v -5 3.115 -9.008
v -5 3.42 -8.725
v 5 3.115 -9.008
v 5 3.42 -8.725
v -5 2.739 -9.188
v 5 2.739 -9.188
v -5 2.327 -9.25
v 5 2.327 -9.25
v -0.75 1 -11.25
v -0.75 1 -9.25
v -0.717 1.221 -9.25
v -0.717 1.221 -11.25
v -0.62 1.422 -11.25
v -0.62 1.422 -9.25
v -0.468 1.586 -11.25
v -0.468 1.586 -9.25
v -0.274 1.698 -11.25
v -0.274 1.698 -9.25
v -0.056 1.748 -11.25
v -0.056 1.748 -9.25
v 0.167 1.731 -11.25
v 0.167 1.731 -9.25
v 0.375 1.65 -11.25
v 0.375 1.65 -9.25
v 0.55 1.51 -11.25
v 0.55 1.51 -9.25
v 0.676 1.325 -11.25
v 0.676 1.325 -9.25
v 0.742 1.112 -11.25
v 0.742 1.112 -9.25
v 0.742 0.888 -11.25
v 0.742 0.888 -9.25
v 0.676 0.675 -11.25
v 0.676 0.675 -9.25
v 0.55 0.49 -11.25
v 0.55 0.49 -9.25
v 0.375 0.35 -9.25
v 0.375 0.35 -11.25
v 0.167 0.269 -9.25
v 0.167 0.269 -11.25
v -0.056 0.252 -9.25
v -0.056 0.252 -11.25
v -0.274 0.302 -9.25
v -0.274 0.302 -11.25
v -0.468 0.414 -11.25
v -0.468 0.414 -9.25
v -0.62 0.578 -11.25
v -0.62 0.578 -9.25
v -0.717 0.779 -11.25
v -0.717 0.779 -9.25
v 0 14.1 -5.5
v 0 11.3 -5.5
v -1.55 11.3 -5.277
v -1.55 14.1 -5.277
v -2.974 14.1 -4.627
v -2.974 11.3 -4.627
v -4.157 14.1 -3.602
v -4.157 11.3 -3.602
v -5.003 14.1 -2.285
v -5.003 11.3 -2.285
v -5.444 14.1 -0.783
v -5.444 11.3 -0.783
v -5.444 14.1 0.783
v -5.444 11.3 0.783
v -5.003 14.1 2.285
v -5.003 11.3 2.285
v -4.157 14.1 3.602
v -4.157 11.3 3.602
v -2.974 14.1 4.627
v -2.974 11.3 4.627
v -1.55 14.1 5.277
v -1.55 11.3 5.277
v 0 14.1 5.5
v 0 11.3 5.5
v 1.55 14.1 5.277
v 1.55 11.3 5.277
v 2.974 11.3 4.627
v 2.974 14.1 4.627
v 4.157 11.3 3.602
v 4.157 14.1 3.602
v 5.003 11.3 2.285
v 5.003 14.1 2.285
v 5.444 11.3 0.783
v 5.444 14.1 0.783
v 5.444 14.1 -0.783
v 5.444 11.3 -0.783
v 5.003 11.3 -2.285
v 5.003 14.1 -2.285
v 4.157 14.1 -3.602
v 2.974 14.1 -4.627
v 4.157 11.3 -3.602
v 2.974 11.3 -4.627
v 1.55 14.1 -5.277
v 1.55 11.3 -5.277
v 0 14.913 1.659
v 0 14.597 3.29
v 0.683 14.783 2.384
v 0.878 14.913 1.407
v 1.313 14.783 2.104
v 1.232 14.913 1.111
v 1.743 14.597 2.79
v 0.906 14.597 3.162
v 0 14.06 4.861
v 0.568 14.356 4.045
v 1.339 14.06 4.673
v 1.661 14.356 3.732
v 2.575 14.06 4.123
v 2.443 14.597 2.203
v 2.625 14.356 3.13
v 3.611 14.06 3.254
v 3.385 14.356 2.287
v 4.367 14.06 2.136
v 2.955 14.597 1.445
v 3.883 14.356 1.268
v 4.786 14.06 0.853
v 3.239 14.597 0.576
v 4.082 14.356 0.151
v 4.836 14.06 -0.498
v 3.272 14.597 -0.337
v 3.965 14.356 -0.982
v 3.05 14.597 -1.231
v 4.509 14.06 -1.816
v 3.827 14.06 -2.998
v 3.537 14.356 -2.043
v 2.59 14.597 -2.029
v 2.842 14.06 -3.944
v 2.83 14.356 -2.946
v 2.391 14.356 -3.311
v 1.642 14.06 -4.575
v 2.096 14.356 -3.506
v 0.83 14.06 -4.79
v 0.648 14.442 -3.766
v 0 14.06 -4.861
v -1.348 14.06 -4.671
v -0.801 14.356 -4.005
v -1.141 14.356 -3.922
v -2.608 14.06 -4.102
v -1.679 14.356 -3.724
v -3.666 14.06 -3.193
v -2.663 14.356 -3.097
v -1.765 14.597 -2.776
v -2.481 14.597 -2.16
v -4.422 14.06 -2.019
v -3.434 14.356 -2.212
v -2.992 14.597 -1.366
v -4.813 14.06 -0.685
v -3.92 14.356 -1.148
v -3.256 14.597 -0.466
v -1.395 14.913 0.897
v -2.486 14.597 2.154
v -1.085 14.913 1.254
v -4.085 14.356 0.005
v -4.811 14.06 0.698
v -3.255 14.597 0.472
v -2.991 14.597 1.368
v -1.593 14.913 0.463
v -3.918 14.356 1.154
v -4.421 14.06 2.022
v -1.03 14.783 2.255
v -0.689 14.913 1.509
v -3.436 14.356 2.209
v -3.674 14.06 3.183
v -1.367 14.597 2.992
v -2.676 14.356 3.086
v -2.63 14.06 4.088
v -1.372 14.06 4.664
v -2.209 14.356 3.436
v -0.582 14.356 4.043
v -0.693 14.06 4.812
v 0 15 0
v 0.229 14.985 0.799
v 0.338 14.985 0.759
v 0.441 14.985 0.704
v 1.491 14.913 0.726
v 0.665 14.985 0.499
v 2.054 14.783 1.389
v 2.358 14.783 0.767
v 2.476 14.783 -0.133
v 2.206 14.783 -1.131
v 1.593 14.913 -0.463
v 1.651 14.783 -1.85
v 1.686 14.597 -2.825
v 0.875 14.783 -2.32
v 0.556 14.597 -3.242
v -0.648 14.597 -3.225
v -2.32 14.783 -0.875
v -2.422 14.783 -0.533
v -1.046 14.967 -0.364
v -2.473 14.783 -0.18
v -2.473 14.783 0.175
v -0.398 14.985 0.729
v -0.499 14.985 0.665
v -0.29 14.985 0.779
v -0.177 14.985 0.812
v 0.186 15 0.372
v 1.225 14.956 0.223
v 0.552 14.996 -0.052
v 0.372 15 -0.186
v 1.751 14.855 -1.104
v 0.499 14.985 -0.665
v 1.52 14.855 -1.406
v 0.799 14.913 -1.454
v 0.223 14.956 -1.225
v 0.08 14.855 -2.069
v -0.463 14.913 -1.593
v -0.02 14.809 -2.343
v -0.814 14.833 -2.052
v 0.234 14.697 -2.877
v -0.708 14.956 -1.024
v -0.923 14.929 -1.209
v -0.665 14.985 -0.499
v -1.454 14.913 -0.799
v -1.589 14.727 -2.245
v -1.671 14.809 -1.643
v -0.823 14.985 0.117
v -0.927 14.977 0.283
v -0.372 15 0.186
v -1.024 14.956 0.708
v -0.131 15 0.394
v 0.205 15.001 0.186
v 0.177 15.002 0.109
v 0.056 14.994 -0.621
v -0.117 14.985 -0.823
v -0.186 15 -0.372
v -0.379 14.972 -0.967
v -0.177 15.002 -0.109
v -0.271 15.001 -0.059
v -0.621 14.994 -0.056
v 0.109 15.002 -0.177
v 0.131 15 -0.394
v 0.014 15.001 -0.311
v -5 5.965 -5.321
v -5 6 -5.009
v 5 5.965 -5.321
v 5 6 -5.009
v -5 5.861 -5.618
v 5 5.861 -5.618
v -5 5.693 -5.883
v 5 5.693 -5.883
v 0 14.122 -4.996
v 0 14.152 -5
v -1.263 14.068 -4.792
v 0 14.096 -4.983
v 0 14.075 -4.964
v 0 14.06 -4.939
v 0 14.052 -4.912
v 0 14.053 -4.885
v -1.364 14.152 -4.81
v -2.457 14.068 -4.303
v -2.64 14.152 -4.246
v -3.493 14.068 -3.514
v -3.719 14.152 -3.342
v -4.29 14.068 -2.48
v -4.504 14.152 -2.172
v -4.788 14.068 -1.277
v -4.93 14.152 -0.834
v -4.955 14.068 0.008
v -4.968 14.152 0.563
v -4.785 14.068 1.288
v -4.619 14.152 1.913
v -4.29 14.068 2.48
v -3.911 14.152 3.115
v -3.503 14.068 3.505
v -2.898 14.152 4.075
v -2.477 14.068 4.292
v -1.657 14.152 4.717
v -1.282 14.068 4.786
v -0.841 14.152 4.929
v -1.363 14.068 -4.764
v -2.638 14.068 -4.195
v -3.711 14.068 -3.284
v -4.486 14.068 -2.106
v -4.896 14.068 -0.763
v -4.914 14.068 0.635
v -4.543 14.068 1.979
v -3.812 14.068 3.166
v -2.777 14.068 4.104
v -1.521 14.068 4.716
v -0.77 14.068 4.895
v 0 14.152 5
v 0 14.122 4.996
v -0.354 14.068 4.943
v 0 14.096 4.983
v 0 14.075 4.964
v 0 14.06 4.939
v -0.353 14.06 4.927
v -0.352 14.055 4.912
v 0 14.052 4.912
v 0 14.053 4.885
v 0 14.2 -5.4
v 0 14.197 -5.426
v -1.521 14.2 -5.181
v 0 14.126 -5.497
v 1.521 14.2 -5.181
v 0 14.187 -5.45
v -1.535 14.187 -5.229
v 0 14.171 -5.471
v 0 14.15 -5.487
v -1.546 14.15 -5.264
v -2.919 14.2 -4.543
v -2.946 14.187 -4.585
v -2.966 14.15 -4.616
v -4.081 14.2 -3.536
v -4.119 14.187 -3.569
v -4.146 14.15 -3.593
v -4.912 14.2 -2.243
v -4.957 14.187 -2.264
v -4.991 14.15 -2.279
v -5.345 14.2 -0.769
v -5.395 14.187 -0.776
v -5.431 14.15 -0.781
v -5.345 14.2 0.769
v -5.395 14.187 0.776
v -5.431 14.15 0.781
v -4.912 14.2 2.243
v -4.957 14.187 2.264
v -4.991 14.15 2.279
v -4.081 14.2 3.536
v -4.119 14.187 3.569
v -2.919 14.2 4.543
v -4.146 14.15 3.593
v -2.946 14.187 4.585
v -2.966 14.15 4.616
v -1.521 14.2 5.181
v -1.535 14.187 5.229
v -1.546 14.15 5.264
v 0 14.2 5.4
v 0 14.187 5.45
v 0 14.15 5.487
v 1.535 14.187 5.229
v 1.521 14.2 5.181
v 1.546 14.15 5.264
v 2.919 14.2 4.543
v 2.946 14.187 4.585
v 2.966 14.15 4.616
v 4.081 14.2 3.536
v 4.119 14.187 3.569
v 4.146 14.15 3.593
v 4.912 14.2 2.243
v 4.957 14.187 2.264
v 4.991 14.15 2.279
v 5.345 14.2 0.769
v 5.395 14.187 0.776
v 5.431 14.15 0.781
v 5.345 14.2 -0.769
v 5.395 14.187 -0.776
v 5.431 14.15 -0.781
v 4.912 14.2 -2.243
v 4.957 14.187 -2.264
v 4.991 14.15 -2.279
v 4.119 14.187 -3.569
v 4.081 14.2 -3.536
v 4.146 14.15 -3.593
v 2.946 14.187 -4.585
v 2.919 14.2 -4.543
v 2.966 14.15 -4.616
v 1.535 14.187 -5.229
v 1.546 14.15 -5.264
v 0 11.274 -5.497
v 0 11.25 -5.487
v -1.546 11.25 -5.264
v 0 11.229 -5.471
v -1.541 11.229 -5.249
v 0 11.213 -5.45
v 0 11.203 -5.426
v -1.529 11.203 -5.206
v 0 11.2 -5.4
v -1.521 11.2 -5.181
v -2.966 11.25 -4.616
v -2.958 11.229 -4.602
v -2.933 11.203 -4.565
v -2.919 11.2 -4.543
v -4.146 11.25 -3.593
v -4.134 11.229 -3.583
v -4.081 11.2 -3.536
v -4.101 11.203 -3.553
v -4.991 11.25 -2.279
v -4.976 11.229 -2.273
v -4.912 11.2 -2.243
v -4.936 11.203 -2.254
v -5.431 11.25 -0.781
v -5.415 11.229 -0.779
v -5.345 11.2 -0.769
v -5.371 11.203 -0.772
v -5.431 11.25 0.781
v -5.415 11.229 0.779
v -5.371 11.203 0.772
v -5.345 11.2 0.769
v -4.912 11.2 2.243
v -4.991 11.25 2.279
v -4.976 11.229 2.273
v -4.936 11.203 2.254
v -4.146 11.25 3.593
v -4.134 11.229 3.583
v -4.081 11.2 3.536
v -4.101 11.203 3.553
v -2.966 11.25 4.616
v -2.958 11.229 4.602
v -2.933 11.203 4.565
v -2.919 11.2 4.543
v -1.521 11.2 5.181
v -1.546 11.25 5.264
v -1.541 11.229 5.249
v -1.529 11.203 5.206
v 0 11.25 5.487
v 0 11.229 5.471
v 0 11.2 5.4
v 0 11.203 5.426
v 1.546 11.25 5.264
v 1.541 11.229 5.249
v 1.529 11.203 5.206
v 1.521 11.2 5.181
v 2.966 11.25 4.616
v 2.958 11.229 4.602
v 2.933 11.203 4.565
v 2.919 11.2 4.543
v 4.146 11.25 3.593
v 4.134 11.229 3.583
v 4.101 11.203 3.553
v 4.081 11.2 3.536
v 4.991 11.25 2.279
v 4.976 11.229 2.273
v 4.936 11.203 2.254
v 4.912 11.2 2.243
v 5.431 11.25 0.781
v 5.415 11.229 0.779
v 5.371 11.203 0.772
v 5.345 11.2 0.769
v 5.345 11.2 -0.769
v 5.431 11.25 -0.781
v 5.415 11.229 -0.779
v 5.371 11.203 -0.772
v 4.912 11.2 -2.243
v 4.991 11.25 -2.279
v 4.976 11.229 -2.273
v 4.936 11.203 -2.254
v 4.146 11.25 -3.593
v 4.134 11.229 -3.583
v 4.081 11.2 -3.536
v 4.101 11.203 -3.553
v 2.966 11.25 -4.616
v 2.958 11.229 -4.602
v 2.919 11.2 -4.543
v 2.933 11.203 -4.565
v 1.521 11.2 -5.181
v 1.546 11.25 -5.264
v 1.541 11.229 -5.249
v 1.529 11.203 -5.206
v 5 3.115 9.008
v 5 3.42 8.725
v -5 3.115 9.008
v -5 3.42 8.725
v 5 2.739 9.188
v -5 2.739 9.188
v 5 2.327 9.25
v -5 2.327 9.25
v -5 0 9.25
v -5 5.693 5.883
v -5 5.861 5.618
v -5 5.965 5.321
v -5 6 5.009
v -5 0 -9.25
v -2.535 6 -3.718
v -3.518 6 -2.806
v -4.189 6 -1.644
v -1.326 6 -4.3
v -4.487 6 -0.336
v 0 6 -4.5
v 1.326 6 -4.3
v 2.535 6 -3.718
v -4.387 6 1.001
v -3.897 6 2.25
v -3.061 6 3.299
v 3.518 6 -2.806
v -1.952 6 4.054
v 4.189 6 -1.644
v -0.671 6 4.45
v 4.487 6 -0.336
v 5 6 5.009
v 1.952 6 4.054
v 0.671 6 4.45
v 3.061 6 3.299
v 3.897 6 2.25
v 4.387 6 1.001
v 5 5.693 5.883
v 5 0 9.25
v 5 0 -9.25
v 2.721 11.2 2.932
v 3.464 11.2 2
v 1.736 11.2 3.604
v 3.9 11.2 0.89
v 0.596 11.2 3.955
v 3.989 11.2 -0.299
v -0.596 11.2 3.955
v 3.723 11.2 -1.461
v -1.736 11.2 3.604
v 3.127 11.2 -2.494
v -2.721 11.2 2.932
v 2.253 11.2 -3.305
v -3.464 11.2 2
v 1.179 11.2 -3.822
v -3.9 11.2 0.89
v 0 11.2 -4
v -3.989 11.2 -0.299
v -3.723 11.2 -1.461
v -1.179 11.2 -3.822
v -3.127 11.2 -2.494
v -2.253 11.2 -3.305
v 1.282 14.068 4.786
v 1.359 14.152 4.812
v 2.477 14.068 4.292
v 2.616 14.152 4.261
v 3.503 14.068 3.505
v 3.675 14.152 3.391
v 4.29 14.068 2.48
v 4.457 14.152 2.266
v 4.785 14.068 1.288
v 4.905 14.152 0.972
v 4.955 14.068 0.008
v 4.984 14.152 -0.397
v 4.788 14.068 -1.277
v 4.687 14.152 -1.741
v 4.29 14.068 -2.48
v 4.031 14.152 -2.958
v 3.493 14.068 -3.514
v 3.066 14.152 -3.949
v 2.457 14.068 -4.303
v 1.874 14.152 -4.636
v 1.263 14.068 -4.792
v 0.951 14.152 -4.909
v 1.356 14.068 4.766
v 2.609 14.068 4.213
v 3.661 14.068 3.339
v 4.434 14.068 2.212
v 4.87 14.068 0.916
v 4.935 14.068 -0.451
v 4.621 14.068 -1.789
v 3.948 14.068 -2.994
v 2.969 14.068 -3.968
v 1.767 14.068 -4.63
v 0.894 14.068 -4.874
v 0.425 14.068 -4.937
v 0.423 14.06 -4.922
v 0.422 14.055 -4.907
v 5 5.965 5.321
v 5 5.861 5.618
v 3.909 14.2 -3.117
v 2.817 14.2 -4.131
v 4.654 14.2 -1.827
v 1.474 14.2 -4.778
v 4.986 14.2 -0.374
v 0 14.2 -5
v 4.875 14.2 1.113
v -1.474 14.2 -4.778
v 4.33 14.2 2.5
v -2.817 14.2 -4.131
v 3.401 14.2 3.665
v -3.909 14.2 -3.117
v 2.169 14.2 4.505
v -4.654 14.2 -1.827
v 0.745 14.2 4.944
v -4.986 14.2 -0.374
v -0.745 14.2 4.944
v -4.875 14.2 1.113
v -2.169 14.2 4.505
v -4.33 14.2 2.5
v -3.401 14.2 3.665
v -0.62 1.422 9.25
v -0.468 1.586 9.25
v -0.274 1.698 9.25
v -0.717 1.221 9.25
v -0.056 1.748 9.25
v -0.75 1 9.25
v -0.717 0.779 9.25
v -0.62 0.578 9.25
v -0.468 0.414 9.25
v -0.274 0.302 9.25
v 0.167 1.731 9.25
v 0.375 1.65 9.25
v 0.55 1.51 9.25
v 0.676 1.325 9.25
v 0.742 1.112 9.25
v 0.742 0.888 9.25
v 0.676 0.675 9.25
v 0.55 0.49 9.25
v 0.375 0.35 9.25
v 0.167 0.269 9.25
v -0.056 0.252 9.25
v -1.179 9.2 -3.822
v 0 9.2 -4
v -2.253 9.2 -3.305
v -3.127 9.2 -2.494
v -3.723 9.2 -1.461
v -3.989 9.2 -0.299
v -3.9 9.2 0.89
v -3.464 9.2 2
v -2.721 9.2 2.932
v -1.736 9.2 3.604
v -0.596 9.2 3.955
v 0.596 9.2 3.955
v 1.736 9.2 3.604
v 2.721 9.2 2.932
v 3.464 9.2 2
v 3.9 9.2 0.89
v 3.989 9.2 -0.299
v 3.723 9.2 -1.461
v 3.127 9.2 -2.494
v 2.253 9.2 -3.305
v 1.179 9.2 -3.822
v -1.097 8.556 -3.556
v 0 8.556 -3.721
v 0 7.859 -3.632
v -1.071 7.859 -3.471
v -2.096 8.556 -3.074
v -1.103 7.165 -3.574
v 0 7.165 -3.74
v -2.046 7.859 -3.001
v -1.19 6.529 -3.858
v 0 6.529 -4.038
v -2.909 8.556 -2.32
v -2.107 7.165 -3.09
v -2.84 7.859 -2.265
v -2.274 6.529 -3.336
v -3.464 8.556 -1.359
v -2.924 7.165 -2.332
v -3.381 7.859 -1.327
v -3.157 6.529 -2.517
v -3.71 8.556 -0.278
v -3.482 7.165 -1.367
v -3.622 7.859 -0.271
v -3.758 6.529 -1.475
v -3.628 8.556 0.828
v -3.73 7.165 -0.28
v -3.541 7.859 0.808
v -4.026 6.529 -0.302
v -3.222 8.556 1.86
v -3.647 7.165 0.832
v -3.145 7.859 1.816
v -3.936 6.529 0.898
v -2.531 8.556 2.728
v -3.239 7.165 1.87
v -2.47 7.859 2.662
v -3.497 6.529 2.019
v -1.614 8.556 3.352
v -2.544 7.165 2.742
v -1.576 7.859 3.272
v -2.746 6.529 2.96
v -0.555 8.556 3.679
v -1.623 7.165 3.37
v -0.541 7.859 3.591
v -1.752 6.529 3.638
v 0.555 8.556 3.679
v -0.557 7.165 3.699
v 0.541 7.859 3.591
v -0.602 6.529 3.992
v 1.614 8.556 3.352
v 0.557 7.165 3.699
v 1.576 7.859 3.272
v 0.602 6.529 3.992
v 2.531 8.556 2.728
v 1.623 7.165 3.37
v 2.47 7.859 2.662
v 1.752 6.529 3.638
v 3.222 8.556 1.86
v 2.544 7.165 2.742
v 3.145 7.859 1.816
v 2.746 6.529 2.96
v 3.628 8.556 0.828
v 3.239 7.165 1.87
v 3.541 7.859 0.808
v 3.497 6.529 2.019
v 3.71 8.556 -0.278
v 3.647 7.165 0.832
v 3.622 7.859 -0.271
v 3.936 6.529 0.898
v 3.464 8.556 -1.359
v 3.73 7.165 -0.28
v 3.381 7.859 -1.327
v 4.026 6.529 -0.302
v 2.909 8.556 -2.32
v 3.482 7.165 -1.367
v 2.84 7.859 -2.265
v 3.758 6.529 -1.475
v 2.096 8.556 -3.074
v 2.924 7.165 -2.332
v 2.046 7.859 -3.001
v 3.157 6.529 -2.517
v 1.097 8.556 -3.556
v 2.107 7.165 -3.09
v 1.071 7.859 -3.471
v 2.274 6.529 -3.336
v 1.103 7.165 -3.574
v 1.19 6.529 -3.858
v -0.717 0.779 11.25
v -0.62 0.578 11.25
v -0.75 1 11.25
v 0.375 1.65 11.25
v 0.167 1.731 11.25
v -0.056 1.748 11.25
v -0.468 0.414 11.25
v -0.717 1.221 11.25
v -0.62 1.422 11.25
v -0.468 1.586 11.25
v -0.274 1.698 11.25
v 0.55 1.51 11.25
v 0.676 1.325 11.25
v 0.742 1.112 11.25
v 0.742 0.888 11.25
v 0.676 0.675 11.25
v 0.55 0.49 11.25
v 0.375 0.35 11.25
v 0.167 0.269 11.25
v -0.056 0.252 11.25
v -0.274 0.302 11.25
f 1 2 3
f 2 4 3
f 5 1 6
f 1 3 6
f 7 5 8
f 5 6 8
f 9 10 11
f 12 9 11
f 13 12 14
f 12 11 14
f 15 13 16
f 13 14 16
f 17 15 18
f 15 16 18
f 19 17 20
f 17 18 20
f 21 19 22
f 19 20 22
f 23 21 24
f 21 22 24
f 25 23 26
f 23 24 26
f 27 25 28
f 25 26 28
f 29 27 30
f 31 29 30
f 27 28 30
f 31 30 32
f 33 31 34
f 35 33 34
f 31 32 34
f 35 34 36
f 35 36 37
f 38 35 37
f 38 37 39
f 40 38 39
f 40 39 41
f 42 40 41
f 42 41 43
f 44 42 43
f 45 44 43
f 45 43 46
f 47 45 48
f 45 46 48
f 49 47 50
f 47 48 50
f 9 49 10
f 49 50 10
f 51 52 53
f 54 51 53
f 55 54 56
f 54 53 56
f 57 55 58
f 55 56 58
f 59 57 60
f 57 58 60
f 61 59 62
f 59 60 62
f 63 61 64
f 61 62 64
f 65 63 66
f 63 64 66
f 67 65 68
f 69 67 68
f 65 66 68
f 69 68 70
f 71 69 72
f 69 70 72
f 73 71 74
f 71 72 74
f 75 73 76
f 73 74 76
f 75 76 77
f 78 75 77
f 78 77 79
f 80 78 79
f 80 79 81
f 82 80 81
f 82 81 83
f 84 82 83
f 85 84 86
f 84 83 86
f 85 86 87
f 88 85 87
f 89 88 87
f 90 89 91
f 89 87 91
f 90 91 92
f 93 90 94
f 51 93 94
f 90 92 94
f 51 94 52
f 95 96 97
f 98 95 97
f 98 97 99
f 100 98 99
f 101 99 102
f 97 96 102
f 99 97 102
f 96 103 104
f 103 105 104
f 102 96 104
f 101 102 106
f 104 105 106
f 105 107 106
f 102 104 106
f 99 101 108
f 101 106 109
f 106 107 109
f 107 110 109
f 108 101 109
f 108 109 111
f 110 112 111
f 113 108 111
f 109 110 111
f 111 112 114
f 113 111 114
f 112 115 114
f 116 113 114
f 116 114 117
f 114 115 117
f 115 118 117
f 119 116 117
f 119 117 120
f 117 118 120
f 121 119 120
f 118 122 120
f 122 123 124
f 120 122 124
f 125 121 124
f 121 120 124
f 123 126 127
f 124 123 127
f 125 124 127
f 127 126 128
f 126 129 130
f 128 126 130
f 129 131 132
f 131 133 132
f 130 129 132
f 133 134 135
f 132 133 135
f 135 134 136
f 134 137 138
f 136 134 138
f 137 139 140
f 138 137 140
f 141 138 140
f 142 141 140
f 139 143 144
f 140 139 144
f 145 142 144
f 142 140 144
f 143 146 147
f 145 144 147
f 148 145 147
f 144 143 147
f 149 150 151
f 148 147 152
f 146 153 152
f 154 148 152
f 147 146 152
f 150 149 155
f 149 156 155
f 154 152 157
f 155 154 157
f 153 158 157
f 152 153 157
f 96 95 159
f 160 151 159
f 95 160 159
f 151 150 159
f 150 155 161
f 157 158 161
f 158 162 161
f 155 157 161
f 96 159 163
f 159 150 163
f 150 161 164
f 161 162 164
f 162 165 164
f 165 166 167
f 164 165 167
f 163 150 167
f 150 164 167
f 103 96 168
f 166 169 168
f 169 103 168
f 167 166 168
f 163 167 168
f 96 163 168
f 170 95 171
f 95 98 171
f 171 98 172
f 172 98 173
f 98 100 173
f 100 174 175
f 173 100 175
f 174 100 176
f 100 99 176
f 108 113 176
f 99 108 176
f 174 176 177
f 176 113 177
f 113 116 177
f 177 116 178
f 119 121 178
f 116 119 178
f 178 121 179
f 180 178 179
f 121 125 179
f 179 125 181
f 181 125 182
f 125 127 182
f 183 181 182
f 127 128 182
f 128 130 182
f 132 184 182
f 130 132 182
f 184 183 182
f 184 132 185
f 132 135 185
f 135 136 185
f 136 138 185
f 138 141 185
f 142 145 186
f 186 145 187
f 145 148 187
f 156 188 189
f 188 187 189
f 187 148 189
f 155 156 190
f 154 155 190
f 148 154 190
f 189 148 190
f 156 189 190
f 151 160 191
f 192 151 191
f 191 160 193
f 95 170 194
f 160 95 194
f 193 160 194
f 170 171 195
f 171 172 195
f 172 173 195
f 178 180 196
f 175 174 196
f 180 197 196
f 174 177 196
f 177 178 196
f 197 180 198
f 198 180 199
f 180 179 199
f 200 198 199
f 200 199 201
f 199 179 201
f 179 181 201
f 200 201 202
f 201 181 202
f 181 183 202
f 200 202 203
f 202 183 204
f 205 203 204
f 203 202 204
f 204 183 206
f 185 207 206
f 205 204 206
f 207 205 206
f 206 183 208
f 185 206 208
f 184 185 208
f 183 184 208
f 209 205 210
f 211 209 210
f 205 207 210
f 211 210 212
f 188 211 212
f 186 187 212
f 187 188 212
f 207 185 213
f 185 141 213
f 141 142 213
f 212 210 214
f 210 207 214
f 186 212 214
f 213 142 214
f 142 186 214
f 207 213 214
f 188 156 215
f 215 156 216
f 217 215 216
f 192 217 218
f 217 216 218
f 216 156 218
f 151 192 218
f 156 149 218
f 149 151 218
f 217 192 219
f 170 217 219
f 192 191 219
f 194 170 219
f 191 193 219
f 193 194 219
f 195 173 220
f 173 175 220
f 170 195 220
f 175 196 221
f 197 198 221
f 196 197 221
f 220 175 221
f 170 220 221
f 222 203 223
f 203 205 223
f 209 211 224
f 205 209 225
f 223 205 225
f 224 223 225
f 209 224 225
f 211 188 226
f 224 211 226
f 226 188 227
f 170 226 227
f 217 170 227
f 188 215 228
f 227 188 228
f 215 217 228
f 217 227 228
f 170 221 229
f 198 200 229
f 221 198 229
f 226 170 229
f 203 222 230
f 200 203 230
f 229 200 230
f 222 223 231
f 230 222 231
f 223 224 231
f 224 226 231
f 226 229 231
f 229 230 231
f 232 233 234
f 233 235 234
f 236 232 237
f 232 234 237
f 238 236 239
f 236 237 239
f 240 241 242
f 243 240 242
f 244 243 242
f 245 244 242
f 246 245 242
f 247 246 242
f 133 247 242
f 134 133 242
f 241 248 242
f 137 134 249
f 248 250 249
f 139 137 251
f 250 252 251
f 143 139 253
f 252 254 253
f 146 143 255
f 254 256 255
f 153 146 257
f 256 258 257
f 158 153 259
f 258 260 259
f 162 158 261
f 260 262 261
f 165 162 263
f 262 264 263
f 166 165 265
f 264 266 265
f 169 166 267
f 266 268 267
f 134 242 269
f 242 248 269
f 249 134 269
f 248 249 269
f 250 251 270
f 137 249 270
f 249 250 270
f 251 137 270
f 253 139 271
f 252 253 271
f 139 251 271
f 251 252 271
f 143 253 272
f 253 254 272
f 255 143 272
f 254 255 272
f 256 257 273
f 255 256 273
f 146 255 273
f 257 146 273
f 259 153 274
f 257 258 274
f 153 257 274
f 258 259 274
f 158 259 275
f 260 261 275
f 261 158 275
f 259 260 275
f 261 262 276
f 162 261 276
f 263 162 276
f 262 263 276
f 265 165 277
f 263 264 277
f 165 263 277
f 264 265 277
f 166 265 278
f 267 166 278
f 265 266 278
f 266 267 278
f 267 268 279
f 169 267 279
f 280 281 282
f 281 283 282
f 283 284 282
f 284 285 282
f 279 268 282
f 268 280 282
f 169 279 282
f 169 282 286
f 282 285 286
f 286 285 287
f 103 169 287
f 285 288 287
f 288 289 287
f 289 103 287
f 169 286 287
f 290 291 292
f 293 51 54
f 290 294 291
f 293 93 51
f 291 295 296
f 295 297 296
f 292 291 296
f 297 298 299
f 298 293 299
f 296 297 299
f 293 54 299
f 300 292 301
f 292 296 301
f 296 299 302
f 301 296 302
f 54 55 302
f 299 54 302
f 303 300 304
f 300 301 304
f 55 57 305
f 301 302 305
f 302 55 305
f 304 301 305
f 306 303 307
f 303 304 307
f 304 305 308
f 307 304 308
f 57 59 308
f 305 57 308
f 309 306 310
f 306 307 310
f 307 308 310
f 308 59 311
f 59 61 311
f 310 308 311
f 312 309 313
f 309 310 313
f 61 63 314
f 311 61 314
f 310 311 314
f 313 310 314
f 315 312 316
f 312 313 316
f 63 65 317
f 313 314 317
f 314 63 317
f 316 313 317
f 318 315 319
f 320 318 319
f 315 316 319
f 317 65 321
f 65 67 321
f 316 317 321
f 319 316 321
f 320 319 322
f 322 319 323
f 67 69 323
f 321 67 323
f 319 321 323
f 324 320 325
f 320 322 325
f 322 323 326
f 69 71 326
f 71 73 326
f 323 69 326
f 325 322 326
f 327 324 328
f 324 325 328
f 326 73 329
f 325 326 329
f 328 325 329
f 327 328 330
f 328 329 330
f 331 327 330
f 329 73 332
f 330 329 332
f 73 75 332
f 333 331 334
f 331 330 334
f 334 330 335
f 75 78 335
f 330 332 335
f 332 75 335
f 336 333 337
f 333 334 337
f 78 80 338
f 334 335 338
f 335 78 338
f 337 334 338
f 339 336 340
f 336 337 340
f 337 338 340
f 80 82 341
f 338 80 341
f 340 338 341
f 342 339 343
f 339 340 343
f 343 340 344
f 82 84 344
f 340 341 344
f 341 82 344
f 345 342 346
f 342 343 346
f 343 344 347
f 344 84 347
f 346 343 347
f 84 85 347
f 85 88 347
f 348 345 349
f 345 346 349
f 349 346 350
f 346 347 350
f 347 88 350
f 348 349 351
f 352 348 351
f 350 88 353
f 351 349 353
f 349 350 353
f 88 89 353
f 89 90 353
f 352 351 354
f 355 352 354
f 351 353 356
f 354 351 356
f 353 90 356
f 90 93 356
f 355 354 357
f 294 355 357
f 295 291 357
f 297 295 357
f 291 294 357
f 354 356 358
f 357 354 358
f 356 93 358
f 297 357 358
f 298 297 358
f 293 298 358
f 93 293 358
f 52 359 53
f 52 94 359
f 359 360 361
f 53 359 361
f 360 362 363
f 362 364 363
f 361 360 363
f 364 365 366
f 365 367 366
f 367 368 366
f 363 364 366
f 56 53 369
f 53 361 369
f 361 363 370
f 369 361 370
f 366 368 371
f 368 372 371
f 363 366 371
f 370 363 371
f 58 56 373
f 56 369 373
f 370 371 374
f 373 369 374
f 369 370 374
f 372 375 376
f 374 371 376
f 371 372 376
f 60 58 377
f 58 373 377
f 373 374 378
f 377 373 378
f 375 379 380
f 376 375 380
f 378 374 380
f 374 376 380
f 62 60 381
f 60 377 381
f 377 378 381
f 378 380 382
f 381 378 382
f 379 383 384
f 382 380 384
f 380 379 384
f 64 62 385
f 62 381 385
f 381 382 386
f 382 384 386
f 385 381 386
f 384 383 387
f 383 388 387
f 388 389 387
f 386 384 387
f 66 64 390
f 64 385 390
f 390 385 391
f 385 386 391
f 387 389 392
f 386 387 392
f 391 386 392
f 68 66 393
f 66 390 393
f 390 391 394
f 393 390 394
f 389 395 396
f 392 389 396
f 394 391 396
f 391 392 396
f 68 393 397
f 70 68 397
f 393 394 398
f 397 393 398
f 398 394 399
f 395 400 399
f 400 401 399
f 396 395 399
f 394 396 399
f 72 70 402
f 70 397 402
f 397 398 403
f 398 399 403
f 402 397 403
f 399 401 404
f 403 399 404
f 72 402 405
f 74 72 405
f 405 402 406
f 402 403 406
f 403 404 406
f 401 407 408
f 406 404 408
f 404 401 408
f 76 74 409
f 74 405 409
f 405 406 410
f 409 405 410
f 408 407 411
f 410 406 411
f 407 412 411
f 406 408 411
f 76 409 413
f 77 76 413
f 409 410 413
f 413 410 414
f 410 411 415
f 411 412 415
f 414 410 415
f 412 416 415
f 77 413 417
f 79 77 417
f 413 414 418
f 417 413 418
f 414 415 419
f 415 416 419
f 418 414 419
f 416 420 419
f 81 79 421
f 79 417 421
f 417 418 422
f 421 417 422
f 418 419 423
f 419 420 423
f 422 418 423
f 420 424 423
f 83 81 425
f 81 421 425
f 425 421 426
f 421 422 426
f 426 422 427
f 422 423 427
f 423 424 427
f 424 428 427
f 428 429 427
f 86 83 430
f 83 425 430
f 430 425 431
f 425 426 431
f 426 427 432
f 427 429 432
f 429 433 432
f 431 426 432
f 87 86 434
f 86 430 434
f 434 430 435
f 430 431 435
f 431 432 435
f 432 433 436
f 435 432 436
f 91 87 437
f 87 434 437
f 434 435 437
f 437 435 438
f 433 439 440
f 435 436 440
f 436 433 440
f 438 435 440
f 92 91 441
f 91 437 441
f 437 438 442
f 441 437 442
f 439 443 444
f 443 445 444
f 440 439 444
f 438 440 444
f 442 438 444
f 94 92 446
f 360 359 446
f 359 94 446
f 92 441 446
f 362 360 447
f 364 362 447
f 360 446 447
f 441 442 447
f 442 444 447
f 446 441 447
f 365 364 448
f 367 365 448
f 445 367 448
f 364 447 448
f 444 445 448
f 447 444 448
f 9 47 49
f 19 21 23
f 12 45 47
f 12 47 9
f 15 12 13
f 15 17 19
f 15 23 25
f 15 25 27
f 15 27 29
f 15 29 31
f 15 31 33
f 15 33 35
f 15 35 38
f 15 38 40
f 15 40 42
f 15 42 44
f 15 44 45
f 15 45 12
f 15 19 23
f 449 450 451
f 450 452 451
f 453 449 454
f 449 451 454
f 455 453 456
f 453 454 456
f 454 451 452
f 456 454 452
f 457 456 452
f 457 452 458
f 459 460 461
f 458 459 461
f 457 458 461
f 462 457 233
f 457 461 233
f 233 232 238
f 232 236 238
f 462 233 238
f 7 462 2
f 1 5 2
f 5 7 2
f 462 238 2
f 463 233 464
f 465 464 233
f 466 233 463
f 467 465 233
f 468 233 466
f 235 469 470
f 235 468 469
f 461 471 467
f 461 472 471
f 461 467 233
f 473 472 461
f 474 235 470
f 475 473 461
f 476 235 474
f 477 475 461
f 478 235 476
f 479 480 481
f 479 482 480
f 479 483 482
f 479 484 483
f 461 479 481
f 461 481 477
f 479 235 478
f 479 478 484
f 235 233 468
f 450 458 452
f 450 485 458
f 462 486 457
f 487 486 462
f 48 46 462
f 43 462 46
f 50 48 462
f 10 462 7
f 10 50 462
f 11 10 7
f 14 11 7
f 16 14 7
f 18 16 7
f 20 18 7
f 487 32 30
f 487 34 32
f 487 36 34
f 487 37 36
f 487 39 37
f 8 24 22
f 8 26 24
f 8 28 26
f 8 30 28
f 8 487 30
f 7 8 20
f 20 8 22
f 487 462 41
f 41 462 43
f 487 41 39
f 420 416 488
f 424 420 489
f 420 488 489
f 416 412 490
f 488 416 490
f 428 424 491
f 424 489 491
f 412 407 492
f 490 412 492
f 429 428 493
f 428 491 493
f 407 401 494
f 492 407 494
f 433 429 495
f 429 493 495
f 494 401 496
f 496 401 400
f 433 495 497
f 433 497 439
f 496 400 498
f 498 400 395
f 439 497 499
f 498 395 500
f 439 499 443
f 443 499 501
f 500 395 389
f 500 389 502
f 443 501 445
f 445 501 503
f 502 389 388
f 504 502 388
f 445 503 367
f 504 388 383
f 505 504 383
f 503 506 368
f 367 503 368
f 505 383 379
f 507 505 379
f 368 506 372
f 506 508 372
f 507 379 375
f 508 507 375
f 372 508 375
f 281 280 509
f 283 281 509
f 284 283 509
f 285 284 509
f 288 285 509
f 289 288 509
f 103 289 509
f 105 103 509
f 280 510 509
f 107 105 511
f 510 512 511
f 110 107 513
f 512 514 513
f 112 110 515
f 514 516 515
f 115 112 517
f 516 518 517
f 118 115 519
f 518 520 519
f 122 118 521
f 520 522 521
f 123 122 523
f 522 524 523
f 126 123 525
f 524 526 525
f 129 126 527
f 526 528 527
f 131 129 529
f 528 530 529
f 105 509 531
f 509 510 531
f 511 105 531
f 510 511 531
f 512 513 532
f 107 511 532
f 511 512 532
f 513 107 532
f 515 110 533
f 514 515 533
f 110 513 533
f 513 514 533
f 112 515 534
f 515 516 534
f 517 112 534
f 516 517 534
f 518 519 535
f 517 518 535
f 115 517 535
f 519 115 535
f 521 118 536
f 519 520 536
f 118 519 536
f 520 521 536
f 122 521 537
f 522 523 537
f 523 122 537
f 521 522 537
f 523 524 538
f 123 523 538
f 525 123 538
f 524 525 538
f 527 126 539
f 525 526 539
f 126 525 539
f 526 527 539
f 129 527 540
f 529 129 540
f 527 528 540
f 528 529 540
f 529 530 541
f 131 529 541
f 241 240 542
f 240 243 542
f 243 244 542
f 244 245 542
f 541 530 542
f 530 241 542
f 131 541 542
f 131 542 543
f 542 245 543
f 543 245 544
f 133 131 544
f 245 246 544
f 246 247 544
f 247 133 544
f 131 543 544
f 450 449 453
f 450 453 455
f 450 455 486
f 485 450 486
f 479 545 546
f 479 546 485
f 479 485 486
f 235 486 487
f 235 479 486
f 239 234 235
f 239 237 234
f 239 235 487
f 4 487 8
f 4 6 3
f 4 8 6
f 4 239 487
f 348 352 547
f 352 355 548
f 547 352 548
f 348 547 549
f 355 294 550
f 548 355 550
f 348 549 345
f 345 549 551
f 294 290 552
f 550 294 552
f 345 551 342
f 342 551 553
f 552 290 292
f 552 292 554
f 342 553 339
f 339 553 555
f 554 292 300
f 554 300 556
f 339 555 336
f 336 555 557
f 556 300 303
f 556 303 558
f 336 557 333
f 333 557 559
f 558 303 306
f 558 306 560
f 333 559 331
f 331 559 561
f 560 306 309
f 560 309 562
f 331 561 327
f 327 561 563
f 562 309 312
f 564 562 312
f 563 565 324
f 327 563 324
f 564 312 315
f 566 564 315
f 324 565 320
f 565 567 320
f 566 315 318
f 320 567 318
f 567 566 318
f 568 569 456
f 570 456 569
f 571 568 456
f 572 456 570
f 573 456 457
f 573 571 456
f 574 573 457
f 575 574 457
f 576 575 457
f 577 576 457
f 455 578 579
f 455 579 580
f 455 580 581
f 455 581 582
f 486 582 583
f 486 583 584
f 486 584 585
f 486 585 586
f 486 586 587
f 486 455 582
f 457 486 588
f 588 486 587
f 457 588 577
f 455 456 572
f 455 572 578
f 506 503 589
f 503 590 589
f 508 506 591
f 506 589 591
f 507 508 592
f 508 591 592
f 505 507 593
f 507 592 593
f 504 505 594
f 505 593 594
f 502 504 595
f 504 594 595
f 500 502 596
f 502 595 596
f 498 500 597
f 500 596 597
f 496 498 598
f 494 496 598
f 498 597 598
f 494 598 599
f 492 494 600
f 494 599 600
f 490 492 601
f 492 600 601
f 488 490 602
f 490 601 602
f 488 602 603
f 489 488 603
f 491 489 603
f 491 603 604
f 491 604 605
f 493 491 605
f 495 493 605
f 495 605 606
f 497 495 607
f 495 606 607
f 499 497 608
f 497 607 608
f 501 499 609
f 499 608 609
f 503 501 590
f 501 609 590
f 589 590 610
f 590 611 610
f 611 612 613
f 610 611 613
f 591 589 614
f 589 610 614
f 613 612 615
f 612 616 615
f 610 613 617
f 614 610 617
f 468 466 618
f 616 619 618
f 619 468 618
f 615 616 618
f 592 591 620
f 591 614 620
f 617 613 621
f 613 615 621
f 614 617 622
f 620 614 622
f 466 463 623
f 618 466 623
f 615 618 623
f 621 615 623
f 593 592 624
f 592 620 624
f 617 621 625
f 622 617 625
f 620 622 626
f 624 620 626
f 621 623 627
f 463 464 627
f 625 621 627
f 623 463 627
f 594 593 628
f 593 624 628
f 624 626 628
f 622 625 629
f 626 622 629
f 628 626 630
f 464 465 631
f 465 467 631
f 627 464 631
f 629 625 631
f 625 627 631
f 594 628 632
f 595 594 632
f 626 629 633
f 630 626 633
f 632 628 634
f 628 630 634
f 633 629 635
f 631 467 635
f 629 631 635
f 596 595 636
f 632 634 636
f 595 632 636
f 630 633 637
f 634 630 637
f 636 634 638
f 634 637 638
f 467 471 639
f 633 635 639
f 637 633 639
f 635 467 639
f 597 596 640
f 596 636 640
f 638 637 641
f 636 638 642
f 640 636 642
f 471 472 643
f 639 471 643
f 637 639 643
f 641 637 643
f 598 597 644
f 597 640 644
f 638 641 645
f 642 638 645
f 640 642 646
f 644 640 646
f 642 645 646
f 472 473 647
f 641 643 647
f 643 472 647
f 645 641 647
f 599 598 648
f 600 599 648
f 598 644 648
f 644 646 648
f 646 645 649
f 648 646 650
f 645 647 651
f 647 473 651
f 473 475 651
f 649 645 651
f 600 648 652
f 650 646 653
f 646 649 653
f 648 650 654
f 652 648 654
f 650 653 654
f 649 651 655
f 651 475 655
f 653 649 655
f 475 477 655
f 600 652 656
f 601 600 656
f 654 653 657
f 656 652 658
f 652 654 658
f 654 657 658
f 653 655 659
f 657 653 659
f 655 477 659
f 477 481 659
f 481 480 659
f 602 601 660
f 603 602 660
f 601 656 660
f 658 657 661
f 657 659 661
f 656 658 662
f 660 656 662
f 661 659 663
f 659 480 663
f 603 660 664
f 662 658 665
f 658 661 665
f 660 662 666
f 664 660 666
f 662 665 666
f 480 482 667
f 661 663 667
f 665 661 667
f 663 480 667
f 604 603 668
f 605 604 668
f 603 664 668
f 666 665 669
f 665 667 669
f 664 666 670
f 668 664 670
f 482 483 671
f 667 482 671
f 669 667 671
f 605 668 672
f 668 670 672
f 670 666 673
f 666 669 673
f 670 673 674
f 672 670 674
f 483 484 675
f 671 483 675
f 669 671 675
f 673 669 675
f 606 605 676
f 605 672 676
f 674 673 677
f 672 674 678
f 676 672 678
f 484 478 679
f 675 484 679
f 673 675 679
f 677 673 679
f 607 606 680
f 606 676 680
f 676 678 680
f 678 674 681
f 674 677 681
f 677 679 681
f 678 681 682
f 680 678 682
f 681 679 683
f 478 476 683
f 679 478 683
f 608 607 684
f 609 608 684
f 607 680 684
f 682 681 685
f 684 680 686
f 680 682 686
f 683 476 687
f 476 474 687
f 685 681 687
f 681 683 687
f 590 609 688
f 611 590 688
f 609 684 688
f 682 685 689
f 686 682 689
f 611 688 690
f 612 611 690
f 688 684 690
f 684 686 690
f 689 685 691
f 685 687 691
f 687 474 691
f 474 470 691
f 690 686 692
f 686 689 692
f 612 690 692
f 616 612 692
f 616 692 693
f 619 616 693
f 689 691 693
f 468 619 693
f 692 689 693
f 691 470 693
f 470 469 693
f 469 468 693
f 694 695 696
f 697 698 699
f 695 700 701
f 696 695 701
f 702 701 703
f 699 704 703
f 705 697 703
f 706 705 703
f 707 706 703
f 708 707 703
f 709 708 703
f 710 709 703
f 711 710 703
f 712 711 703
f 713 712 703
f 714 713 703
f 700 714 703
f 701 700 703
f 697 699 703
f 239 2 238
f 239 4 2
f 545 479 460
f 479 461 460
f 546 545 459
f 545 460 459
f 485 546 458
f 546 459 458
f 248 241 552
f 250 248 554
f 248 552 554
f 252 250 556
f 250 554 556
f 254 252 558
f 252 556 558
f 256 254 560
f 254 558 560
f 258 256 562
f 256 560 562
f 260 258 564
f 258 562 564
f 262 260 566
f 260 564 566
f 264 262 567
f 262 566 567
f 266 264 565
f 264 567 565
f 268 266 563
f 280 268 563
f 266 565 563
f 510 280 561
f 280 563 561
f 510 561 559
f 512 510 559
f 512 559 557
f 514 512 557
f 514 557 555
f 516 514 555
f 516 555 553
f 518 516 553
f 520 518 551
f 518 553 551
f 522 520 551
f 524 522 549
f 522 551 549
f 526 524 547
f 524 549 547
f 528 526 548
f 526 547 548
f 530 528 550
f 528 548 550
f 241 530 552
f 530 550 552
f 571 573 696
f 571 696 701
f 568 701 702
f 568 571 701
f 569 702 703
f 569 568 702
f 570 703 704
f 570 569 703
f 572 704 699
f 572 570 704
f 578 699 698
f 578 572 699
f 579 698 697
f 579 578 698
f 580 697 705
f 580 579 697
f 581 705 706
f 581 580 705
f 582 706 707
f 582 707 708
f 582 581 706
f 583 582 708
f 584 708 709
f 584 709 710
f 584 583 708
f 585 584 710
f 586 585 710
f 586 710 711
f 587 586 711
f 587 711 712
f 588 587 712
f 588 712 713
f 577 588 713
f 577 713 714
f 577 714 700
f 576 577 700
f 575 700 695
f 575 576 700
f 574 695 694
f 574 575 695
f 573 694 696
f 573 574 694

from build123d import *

# Parameters (mm, degrees)
BOSS_EXTRUDE1_DEPTH = 5
FILLET1_R           = 0.1
FILLET2_R           = 0.1
FILLET3_R           = 1.4
SKETCH4_R           = 0.75
BOSS_EXTRUDE2_DEPTH = 2


with BuildPart() as part:
    # Sketch1 → Boss-Extrude1 (new body, symmetric)
    with BuildSketch(Plane(origin=(0, 0, 0), x_dir=(0, 0, -1), z_dir=(1, 0, 0))):
        Polygon((-9.25, 0), (9.25, 0), (9.25, 3), (5.5, 6), (-5.5, 6), (-9.25, 3), align=None)
    extrude(amount=BOSS_EXTRUDE1_DEPTH, both=True)

    # Sketch2 → Revolve1 (revolve)
    with BuildSketch(Plane(origin=(0, 0, 0), x_dir=(0, 0, -1), z_dir=(1, 0, 0))):
        with BuildLine():
            Line((0, 6), (0, 14))
            Line((0, 14), (5, 14))
            Line((5, 14), (5, 14.2))
            Line((5, 14.2), (5.5, 14.2))
            Line((5.5, 14.2), (5.5, 11.2))
            Line((5.5, 11.2), (4, 11.2))
            Line((4, 11.2), (4, 9.2))
            ThreePointArc((4, 9.2), (3.661737334, 7.508083958), (4.5, 6))
            Line((4.5, 6), (0, 6))
        make_face()
    revolve(axis=Axis((0, 6, 0), (0, 1, 0)))

    # Sketch3 → Revolve2 (revolve)
    with BuildSketch(Plane(origin=(0, 0, 0), x_dir=(0, 0, -1), z_dir=(1, 0, 0))):
        with BuildLine():
            Line((0, 14.2), (0, 15))
            ThreePointArc((0, 15), (-2.553728094, 14.768640471), (-5, 14))
            Line((-5, 14), (0, 14))
            Line((0, 14), (0, 14.2))
        make_face()
    revolve(axis=Axis((0, 14.2, 0), (0, 1, 0)))

    # Fillet1
    fillet1_edges = [part.edges().sort_by_distance(p)[0] for p in [
        (0, 11.2, 5.5),
        (0, 14.2, 5.5),
    ]]
    fillet(fillet1_edges, radius=FILLET1_R)

    # Fillet2
    fillet2_edges = [part.edges().sort_by_distance(p)[0] for p in [
        (5, 14, 0),
    ]]
    fillet(fillet2_edges, radius=FILLET2_R)

    # Fillet3
    fillet3_edges = [part.edges().sort_by_distance(p)[0] for p in [
        (0, 3, 9.25),
        (0, 6, 5.5),
        (0, 6, -5.5),
        (0, 3, -9.25),
    ]]
    fillet(fillet3_edges, radius=FILLET3_R)

    # Sketch4 → Boss-Extrude2 (add)
    with BuildSketch(Plane(origin=(0, 0, -9.25), x_dir=(-1, 0, 0), z_dir=(0, 0, -1))):
        with Locations((0, 1)):
            Circle(SKETCH4_R)
    boss_extrude2 = extrude(amount=BOSS_EXTRUDE2_DEPTH)

    # Mirror1: Boss-Extrude2 across plane
    add(boss_extrude2.mirror(Plane.XY))


solid = part.part
